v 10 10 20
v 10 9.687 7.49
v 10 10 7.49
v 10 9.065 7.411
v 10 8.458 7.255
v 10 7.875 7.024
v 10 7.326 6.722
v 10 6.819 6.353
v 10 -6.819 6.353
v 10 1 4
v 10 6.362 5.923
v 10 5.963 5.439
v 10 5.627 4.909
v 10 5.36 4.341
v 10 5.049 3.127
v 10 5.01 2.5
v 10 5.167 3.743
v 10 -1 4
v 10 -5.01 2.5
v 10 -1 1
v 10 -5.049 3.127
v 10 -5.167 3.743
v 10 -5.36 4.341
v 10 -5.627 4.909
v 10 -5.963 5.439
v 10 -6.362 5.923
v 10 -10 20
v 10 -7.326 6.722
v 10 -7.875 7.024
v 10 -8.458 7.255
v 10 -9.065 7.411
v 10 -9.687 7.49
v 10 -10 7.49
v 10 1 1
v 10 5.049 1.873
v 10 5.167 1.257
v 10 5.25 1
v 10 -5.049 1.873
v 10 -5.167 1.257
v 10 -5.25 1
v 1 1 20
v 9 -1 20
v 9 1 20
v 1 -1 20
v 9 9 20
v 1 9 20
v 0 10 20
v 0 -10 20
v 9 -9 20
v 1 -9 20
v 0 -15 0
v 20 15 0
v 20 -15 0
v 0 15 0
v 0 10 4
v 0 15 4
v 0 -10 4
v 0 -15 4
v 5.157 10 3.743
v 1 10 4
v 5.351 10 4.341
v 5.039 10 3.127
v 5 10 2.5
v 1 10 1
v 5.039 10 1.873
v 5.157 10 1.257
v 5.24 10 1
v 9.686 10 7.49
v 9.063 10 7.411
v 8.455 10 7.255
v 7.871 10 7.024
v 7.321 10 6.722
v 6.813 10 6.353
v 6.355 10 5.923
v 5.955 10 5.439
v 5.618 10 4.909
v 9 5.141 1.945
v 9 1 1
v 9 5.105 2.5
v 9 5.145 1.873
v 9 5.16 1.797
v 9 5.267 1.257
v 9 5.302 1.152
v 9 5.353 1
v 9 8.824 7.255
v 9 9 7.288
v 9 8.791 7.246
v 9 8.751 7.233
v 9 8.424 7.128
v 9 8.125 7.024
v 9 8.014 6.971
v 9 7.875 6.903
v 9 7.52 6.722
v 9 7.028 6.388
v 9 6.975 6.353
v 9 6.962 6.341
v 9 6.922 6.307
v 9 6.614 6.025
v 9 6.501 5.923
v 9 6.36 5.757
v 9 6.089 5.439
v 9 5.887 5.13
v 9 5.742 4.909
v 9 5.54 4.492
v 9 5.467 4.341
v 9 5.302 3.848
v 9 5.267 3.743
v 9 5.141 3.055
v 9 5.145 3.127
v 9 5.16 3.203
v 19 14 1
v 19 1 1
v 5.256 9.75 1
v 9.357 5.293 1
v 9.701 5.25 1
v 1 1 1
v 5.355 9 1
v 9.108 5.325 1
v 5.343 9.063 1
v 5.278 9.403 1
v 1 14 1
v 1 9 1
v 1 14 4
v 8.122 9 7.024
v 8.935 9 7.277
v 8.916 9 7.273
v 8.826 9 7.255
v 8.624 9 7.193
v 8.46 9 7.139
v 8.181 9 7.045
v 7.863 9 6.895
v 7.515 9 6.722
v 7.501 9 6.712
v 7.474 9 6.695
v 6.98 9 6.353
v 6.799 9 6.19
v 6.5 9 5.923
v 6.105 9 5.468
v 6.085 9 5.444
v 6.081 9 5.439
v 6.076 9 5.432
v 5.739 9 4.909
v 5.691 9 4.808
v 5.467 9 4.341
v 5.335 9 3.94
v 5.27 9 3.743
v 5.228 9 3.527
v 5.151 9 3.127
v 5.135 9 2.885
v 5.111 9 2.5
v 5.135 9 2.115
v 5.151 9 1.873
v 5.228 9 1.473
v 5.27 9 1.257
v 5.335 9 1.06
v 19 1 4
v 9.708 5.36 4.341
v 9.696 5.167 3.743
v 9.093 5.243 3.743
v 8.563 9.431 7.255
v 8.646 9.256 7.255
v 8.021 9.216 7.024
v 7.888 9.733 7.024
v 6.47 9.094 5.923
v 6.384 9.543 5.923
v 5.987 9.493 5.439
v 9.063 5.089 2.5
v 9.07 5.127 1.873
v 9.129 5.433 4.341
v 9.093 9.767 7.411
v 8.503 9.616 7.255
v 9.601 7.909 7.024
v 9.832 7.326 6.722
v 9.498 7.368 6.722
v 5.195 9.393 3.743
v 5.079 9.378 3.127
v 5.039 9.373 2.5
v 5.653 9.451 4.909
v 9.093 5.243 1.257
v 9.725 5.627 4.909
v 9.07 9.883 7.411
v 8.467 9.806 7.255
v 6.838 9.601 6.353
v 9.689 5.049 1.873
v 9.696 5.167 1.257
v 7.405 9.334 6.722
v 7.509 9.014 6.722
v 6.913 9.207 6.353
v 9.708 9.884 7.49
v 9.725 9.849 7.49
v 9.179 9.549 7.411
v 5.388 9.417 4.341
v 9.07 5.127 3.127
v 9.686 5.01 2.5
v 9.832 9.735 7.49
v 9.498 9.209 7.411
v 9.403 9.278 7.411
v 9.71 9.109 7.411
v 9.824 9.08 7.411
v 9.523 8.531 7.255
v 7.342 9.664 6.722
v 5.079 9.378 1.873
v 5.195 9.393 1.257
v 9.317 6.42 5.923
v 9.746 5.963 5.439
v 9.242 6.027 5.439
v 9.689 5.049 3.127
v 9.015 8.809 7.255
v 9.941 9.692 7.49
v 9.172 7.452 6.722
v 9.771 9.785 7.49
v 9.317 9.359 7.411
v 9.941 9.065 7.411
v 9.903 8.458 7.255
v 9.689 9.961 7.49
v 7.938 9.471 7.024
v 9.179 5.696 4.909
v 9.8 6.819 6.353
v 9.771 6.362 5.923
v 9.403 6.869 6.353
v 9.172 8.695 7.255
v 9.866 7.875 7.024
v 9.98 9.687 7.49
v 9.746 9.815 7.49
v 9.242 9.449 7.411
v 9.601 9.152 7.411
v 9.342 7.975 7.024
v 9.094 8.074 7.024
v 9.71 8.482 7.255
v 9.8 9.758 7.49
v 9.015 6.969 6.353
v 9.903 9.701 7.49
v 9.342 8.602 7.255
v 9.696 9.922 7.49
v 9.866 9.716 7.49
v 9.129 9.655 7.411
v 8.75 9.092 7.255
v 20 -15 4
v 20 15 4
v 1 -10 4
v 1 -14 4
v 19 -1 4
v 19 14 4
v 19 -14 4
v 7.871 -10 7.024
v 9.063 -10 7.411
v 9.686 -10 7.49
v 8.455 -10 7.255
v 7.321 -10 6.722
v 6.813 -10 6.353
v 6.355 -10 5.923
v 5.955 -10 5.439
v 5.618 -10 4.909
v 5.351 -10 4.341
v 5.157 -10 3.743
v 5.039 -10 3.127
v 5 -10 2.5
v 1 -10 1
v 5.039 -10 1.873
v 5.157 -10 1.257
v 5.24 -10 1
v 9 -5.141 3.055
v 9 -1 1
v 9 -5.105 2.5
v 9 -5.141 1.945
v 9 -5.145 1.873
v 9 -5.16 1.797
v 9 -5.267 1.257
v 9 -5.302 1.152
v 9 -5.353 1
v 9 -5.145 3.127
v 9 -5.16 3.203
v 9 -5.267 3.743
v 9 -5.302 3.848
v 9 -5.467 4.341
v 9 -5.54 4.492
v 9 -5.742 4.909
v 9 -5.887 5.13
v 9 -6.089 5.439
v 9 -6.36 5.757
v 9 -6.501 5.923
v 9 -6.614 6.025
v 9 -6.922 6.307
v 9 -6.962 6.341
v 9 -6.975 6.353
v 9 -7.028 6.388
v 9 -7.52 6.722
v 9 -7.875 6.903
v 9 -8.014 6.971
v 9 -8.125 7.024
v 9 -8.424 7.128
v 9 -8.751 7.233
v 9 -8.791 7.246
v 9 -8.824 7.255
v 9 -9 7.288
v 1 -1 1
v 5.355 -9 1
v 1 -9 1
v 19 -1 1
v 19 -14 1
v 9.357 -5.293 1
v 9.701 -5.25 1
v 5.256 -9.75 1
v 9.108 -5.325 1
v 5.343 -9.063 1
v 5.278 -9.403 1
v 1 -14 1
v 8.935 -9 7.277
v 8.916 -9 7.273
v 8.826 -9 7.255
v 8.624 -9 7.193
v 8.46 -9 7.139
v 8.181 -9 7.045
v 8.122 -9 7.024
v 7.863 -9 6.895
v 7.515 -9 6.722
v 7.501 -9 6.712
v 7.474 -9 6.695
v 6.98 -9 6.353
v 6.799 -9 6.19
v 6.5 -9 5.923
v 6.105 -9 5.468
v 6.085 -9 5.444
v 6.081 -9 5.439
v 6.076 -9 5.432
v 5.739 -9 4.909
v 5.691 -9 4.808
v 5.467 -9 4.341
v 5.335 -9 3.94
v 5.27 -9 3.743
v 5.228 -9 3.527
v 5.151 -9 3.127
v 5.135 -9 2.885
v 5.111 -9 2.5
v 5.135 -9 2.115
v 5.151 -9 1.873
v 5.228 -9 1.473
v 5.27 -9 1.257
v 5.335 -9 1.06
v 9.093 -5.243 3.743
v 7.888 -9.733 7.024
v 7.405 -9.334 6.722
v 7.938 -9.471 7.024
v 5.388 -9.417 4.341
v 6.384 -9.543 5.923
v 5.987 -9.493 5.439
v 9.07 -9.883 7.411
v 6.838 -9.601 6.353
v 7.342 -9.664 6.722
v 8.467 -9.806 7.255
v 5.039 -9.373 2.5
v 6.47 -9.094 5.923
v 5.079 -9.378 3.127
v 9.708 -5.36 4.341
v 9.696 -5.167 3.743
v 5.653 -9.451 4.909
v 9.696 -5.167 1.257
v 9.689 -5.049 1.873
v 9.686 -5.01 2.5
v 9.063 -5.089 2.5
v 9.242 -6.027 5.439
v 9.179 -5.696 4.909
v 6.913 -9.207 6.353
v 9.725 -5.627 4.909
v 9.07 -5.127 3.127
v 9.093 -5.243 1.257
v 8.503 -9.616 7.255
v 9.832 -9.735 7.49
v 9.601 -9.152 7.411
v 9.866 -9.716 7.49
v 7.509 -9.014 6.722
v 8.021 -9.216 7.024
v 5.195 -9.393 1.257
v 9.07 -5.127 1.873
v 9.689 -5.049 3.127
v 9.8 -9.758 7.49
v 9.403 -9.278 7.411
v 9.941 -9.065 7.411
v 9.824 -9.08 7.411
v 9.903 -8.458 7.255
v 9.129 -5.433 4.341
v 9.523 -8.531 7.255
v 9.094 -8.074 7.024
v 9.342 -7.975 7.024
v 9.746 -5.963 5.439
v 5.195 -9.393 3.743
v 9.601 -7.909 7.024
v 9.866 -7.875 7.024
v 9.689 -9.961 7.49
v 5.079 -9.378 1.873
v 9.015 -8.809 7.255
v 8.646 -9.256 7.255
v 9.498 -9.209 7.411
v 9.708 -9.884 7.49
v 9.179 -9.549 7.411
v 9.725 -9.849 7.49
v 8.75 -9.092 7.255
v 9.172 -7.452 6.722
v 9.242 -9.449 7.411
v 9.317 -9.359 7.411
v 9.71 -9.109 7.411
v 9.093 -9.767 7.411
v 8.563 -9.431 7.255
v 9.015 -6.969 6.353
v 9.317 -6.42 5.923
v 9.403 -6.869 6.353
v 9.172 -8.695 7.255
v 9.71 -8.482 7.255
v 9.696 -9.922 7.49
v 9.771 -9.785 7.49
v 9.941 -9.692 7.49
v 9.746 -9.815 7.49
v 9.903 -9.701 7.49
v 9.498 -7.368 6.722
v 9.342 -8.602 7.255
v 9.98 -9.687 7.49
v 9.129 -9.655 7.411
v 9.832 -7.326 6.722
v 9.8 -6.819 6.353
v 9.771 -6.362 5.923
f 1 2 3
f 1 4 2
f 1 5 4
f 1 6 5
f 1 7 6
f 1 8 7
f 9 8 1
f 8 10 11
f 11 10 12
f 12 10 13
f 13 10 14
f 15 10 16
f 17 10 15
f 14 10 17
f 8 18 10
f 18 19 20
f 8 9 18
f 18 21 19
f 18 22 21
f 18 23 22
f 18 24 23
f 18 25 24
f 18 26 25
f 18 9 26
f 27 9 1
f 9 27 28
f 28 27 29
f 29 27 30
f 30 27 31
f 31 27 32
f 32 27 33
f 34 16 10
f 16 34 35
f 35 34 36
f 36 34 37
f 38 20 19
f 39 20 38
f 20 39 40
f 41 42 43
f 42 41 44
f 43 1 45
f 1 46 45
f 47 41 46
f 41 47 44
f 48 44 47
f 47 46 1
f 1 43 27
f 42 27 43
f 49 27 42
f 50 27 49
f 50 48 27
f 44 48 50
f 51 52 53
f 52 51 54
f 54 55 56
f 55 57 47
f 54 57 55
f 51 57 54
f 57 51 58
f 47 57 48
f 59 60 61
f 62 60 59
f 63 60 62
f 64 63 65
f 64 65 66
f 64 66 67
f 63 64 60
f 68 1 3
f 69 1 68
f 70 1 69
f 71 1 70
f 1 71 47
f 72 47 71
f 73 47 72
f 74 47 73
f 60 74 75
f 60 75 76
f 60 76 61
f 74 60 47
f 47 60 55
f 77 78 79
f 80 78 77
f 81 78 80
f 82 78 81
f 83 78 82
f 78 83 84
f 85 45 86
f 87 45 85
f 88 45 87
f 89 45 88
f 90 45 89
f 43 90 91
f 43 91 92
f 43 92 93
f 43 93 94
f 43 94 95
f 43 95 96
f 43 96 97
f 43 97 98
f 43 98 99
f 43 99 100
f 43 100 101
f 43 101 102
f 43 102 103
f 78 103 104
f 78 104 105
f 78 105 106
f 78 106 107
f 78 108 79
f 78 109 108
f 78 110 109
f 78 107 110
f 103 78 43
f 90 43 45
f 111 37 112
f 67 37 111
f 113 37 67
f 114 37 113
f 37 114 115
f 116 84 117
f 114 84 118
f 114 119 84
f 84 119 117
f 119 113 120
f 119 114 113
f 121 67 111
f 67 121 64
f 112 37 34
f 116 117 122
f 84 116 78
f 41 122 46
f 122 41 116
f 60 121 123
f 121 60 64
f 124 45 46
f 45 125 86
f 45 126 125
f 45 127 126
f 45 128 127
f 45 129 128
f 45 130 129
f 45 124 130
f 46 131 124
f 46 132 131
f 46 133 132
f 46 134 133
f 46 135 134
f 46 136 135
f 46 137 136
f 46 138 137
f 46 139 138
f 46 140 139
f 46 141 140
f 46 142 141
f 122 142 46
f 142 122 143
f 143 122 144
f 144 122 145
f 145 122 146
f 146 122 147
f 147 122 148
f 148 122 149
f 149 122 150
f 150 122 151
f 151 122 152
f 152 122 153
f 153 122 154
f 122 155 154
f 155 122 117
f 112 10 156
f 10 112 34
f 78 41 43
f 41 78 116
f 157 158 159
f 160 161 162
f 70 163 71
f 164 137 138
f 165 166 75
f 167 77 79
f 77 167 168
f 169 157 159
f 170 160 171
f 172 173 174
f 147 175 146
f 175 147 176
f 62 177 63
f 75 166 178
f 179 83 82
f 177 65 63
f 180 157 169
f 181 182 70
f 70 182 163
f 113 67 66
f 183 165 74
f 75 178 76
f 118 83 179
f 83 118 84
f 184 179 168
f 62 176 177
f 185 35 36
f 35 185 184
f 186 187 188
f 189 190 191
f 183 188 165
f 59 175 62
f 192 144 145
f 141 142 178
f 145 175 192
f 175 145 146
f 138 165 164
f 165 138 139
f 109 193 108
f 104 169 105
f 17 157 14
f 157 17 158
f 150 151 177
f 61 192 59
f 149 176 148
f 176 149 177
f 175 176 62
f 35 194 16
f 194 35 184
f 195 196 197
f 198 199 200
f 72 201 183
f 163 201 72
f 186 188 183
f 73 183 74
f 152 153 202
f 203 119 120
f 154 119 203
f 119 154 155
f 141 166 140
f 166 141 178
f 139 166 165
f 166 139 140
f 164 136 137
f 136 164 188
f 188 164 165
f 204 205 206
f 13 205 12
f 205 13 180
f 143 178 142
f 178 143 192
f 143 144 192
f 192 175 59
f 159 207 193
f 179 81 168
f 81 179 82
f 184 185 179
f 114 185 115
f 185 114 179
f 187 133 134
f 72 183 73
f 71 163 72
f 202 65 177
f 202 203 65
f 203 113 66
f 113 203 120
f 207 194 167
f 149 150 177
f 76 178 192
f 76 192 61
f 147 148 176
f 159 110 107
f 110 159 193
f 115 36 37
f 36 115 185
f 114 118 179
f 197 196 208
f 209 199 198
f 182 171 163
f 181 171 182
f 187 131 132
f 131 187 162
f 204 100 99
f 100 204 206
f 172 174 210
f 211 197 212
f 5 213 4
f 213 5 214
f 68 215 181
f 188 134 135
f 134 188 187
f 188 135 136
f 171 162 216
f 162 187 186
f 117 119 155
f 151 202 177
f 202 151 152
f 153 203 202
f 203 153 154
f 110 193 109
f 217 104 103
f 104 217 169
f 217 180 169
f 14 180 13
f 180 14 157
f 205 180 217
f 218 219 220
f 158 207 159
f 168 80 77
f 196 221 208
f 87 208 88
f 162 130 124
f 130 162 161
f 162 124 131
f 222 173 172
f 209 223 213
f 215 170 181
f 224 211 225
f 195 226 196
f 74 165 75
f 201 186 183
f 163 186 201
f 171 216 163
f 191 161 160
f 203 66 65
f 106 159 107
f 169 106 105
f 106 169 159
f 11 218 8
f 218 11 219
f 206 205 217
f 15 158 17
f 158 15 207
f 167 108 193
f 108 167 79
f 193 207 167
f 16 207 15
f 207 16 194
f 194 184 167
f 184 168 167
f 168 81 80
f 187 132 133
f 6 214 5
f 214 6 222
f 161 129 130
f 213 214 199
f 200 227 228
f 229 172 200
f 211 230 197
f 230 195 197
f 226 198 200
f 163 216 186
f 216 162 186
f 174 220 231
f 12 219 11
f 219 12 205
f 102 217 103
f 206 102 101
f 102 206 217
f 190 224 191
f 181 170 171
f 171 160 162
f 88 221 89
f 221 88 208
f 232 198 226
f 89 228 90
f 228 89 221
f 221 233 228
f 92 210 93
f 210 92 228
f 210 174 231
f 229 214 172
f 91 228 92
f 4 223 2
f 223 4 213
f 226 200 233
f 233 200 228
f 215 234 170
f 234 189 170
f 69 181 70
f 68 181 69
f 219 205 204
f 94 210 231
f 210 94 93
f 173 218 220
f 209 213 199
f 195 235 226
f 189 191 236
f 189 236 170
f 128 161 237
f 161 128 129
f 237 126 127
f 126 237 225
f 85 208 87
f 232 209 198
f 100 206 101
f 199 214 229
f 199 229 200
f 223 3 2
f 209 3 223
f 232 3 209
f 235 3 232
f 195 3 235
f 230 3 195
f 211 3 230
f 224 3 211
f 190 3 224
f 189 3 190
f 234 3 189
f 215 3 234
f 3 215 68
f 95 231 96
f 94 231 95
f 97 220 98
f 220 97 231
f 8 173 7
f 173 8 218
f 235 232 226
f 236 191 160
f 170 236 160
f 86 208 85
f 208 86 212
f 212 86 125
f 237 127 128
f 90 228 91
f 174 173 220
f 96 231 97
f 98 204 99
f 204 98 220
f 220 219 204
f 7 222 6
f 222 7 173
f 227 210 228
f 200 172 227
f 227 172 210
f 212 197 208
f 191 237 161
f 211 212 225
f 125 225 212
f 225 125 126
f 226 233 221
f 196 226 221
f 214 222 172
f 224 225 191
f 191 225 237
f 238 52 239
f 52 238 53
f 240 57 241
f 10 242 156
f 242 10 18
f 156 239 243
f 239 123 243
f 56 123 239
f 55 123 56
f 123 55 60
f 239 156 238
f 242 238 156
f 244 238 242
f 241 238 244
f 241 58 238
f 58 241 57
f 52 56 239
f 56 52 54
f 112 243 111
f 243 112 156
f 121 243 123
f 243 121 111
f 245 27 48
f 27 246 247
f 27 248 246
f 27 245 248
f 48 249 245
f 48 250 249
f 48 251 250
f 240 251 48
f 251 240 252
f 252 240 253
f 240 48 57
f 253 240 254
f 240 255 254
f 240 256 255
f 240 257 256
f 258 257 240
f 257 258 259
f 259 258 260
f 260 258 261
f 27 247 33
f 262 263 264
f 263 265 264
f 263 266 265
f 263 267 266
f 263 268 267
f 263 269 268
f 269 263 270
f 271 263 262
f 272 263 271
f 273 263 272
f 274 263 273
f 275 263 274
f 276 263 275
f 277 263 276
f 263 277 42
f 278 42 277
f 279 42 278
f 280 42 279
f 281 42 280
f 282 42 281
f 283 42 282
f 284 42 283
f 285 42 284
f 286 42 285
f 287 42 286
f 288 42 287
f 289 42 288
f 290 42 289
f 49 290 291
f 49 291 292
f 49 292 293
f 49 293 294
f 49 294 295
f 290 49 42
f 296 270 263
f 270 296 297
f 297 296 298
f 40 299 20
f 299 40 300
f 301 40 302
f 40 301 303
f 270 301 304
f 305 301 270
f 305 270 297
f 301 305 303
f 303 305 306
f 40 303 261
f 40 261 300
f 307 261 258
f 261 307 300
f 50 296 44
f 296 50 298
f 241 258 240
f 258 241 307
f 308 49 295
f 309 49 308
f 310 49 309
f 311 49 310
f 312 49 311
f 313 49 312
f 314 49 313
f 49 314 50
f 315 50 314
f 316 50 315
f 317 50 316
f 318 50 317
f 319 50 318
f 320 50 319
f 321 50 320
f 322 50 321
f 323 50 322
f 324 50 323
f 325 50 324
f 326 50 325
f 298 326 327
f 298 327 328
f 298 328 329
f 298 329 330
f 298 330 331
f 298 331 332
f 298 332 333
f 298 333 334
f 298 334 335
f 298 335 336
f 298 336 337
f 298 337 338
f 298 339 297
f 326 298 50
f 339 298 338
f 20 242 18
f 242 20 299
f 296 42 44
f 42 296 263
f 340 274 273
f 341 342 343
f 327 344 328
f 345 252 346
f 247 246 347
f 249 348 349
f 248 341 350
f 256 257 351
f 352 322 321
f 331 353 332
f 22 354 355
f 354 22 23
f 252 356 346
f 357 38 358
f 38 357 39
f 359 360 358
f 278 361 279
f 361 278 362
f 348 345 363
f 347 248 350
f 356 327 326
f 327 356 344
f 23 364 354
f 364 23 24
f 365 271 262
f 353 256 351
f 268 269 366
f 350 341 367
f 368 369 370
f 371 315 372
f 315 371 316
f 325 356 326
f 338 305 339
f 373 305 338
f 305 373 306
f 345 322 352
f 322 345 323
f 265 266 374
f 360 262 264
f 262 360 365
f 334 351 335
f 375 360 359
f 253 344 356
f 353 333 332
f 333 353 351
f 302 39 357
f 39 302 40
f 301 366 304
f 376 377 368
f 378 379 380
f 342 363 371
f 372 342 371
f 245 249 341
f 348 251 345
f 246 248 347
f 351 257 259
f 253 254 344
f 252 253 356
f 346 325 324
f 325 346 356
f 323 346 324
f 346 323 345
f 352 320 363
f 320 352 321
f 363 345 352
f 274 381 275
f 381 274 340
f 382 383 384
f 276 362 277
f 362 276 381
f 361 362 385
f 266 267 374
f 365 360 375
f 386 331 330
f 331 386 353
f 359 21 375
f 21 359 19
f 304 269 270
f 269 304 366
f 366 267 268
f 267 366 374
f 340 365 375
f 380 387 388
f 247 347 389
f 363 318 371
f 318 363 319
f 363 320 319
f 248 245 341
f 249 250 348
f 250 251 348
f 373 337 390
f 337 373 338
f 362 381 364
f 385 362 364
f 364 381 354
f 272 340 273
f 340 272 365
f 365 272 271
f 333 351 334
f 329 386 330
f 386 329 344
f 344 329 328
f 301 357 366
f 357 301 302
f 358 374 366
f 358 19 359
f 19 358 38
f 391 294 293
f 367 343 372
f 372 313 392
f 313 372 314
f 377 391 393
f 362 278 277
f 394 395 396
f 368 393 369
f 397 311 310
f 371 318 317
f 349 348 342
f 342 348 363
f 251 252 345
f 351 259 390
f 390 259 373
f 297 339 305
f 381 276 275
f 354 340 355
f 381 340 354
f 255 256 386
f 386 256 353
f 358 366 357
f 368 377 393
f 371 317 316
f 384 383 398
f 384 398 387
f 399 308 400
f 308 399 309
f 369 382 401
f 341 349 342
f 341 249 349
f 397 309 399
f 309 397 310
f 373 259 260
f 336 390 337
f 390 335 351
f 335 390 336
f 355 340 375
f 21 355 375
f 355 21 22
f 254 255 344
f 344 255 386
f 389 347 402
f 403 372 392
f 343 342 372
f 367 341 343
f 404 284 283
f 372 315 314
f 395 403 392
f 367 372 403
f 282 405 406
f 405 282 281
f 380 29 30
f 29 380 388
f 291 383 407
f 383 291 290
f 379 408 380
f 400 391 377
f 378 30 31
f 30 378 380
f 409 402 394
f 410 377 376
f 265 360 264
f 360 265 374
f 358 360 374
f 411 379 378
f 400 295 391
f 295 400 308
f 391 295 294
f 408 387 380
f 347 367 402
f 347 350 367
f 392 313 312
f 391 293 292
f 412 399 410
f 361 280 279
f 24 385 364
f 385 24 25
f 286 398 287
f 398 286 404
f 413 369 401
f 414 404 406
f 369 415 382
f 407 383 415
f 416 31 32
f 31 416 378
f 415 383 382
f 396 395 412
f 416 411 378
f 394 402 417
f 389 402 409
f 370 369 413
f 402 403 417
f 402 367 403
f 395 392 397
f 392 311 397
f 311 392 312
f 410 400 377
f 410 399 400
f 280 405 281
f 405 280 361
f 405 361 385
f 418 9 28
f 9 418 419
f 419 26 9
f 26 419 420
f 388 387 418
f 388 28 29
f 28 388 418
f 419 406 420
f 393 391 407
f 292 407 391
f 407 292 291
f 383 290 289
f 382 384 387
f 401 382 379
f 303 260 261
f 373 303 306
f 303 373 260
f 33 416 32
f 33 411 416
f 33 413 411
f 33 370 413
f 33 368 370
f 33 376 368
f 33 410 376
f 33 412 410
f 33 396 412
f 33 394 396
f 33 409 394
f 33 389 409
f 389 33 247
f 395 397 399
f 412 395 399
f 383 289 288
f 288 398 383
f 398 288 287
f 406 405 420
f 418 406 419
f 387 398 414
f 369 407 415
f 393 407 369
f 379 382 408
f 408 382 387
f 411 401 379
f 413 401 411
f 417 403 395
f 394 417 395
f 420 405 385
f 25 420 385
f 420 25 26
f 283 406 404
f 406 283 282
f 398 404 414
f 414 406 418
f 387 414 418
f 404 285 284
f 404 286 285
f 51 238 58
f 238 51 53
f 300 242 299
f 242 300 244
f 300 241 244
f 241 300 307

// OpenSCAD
// Transforming Shapes - Desktop Organizer

$fn = 50;

height = 20;
width = 10;

// pen holder
difference() {
    cube([width, width, height]);
    translate([1, 1, 1]) cube([width-2, width-2, height]);
    translate([width, width, width/4]) sphere(width/2);
}
// tray
difference() {
    cube([width*2, width*1.5, 4]);
    translate([1, 1, 1]) cube([width*2 - 2, width*1.5 - 2, 5]);
}

mirror([0, 1, 0]) {
    // pencil holder
    difference() {
        cube([width, width, height]);
        translate([1, 1, 1]) cube([width-2, width-2, height]);
        translate([width, width, width/4]) sphere(width/2);
    }
    // tray
    difference() {
        cube([width*2, width*1.5, 4]);
        translate([1, 1, 1]) cube([width*2 - 2, width*1.5 - 2, 5]);
    }
}
